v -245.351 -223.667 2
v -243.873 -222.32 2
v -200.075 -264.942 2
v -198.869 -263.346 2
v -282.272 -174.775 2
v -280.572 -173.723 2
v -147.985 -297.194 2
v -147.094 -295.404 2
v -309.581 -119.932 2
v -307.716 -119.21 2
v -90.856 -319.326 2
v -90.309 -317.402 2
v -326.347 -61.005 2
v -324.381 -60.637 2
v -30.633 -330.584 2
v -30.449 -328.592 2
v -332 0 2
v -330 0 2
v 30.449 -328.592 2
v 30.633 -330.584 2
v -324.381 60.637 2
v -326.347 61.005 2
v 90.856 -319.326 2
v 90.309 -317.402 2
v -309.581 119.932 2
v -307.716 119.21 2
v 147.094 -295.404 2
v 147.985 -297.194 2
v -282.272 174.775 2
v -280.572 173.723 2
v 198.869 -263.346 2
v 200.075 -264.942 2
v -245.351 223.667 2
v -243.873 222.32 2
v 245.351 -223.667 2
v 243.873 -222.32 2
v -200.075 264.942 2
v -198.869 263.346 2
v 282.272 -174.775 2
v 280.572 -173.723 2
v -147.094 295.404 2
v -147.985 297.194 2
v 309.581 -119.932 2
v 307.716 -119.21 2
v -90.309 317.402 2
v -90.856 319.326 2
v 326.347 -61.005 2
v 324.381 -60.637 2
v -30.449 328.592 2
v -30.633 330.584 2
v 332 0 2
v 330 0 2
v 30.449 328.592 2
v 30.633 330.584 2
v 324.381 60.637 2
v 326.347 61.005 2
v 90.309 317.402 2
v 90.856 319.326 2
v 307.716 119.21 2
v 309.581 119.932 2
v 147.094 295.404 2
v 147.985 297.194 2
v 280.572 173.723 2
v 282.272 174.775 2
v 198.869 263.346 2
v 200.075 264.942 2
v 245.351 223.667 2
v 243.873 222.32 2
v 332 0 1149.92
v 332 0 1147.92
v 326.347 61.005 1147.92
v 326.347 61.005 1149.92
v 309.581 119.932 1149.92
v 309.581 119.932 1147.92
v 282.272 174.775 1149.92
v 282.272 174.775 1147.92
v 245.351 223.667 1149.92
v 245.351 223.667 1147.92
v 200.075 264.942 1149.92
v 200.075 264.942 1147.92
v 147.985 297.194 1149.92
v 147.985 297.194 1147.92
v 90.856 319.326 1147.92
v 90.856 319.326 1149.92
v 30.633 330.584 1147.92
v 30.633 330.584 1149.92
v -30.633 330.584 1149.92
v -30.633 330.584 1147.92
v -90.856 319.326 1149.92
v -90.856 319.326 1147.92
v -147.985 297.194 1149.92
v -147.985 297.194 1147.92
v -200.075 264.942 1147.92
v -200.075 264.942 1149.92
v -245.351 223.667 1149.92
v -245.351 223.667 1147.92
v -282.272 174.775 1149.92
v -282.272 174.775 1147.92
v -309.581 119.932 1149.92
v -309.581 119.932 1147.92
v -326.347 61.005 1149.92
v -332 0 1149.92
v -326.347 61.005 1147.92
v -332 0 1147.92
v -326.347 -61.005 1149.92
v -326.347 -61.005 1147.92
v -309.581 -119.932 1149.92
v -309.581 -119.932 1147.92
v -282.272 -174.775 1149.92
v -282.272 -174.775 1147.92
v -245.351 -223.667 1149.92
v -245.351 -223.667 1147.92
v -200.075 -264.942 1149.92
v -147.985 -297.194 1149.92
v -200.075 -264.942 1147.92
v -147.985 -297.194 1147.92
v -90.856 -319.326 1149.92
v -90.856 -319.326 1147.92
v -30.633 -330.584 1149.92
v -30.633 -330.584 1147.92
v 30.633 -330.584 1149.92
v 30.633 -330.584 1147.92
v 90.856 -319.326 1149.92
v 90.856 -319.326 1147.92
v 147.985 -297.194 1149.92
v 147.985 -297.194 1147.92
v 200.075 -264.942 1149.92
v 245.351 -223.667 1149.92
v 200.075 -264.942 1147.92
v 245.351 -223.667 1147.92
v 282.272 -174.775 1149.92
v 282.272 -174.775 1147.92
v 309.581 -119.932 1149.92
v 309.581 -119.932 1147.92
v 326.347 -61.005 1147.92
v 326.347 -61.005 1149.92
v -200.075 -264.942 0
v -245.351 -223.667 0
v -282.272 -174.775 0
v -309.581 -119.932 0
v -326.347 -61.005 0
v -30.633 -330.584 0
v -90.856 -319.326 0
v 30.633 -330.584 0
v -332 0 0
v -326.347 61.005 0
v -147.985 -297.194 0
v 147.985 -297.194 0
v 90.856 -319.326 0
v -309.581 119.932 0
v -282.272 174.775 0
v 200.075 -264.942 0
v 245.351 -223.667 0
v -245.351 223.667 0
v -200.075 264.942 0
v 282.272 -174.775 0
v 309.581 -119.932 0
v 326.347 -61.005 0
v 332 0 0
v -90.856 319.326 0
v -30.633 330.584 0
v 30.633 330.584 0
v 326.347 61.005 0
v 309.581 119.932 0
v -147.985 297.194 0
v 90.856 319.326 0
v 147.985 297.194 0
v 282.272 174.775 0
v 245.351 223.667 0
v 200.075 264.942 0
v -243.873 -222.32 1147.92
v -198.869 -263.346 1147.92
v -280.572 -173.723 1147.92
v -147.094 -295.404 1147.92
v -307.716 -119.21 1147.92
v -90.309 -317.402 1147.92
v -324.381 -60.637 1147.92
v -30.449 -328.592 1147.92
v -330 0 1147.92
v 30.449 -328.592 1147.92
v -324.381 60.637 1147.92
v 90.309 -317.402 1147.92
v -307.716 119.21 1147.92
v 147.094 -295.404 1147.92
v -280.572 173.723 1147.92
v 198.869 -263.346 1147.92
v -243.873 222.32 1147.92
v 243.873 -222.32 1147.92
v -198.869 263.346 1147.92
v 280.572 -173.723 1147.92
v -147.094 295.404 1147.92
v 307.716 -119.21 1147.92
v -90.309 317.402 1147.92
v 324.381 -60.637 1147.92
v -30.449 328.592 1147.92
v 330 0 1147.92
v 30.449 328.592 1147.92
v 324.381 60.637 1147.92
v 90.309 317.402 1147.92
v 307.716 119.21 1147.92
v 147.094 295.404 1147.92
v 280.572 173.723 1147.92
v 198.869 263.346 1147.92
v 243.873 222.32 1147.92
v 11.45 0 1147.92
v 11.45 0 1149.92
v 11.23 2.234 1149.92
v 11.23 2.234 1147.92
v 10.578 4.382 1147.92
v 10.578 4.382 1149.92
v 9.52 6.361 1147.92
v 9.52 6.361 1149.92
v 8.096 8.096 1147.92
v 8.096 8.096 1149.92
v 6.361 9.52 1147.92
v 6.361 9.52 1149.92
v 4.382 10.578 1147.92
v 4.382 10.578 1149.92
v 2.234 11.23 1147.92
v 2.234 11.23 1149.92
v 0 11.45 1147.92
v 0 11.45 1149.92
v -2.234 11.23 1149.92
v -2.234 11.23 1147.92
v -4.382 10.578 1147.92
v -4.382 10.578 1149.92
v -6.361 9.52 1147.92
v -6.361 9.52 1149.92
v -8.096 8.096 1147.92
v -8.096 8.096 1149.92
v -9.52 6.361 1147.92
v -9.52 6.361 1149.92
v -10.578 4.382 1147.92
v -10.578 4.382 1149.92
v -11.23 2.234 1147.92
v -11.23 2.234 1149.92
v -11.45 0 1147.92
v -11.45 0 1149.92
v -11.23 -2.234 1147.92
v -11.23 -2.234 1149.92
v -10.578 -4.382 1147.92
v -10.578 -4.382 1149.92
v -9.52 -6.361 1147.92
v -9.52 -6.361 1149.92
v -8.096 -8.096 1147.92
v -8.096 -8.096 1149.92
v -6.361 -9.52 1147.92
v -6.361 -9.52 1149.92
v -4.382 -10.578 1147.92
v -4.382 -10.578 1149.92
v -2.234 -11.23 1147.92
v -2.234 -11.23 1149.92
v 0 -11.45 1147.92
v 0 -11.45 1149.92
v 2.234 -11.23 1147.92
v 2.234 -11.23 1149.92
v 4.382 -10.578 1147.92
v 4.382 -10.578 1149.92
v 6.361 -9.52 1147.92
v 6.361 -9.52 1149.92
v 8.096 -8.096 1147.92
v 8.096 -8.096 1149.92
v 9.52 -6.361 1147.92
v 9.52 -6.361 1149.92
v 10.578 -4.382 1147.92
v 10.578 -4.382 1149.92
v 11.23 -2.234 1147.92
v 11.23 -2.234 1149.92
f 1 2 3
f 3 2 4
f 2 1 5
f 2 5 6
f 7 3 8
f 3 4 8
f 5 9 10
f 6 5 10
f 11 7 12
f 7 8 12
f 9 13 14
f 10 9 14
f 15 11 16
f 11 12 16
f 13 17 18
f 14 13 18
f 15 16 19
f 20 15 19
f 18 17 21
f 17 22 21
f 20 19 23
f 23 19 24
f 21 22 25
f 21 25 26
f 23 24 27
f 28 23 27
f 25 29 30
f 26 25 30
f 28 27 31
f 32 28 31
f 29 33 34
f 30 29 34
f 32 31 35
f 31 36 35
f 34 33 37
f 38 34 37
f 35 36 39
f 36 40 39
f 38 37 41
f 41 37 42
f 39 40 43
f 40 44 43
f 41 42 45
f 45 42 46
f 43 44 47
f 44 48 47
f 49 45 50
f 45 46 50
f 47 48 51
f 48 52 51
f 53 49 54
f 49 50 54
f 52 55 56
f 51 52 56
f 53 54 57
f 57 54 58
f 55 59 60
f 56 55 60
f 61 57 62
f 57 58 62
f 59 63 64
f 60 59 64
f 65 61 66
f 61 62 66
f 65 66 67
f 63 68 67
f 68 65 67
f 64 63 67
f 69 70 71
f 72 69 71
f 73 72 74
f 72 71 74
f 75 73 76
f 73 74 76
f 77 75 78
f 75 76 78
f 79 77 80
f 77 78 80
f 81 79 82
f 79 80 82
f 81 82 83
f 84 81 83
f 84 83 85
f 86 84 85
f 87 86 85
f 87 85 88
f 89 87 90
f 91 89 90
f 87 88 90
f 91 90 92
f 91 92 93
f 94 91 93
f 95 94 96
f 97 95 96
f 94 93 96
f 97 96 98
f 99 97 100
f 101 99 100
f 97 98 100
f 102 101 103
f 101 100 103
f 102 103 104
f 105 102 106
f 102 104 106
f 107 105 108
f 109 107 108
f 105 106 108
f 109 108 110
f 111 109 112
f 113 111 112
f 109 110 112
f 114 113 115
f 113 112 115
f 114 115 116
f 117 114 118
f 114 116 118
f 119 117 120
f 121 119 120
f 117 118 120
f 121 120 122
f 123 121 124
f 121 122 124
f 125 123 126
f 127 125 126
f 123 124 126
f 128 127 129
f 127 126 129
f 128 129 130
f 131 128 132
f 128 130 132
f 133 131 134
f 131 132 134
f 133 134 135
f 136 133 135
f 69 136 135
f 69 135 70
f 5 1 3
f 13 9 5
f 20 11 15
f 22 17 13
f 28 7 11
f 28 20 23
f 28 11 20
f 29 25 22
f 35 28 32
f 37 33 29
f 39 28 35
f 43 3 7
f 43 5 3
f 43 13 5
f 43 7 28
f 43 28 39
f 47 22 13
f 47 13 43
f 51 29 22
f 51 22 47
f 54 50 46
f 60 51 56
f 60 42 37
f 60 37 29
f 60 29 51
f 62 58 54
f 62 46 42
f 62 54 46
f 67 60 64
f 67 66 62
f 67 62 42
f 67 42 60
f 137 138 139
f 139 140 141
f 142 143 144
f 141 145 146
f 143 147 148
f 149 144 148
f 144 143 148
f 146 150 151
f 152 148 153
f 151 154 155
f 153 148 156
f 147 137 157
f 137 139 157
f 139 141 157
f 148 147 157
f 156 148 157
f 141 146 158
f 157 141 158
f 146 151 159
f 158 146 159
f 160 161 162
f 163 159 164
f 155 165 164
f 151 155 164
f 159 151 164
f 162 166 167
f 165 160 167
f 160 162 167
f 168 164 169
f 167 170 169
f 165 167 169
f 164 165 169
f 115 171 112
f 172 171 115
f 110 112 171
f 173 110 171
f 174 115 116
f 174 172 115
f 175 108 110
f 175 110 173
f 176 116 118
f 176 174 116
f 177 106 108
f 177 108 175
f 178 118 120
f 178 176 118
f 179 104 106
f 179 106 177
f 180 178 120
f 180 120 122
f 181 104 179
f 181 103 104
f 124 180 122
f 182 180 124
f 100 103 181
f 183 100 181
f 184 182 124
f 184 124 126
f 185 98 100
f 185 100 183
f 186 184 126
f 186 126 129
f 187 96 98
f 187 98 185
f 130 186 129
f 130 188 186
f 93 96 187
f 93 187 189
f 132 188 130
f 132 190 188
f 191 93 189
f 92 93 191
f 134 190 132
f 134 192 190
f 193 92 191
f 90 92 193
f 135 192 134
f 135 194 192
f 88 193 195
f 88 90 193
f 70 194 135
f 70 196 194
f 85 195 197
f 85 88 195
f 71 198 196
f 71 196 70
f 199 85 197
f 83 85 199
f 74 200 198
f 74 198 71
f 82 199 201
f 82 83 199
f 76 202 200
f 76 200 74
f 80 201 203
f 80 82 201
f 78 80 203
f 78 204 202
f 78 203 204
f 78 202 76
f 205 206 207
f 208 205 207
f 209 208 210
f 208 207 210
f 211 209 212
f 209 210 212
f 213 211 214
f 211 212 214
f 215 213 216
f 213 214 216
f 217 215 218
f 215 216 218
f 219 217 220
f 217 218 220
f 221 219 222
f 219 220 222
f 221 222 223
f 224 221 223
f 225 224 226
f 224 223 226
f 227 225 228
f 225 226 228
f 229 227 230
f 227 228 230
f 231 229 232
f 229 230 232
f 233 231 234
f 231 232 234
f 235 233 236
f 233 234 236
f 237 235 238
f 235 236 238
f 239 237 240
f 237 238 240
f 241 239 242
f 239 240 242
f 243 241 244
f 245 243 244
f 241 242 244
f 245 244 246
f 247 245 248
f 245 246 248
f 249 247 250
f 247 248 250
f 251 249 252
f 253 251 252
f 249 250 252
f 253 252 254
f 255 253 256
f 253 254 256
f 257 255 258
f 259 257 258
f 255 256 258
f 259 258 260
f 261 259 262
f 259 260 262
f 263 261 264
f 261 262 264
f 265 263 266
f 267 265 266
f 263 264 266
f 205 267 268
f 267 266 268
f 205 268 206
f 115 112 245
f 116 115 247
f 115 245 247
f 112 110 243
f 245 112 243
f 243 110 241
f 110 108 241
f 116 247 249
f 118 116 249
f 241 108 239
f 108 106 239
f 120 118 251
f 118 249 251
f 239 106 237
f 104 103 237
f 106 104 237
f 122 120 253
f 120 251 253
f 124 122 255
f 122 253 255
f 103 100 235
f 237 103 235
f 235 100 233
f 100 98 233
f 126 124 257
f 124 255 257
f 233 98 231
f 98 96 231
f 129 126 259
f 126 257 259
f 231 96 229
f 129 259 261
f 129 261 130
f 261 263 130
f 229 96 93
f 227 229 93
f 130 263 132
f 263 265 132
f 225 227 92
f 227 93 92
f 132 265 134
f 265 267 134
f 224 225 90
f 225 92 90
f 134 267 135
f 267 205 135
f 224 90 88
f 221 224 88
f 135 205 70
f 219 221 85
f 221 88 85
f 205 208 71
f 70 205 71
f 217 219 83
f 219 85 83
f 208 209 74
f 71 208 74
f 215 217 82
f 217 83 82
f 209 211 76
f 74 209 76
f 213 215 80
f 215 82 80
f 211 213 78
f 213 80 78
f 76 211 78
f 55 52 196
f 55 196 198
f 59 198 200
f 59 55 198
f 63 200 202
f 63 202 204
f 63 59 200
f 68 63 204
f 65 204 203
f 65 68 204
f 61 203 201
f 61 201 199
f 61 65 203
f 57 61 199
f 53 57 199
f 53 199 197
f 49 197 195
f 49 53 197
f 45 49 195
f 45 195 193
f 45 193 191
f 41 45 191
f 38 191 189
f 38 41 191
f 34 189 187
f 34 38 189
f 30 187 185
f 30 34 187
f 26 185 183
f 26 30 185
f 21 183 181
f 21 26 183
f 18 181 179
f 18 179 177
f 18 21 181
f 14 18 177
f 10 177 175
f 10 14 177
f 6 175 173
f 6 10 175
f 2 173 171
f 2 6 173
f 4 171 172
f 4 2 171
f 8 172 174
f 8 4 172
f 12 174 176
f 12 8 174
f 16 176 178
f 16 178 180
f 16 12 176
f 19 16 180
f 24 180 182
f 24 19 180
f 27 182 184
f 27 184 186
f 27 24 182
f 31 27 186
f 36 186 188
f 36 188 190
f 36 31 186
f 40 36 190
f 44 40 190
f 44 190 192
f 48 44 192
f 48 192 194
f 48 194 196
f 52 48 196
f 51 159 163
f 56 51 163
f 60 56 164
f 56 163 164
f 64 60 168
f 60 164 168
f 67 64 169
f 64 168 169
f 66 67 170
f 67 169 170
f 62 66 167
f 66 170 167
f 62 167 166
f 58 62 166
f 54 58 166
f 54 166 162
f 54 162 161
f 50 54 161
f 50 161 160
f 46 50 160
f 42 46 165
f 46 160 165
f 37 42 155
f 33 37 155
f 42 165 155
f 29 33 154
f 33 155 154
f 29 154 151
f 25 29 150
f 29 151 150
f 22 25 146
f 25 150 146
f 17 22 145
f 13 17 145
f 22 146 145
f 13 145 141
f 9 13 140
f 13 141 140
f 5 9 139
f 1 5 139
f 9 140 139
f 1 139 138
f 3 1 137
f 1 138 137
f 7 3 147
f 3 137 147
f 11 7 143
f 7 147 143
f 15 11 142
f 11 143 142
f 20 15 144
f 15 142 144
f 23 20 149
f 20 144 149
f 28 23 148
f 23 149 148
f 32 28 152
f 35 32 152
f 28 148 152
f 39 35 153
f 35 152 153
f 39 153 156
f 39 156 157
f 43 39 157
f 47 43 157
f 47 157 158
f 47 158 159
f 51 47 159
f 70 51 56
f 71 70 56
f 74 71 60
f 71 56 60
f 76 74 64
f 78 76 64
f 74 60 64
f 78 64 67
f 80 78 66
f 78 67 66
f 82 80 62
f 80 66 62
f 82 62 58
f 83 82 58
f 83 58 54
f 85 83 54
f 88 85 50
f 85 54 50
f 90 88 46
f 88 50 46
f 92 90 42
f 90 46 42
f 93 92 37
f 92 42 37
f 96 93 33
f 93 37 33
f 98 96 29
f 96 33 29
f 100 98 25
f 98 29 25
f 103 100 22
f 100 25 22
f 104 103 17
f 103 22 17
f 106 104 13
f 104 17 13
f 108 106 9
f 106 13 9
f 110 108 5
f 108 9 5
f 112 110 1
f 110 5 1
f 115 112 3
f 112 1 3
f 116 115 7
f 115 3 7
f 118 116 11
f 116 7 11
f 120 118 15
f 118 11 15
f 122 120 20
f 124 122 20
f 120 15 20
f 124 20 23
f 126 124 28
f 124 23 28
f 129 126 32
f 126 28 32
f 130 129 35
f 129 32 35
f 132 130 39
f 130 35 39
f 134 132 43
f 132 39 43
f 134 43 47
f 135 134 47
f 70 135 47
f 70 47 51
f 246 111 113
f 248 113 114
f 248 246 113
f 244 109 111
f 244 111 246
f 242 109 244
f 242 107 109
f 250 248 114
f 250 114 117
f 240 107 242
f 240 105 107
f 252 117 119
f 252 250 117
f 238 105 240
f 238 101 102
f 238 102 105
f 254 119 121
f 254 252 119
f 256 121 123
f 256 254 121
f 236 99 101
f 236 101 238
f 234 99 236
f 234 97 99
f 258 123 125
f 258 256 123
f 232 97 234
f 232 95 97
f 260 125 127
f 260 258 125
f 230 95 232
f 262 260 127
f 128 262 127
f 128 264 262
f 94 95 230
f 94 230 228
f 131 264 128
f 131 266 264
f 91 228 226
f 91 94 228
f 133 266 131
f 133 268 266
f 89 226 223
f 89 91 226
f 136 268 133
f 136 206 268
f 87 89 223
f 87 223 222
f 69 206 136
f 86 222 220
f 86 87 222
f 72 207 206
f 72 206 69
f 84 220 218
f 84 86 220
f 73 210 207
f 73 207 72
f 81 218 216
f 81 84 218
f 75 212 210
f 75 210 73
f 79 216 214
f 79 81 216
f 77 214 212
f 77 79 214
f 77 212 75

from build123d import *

# Parameters (mm, degrees)
SKETCH1_R           = 332
BOSS_EXTRUDE1_DEPTH = 2
SKETCH2_R           = 332
SKETCH2_R_2         = 330
BOSS_EXTRUDE2_DEPTH = 1145.92
SKETCH4_R           = 332
BOSS_EXTRUDE4_DEPTH = 2
SKETCH5_R           = 11.45
CUT_EXTRUDE1_DEPTH  = 2


with BuildPart() as part:
    # Sketch1 → Boss-Extrude1 (new body)
    with BuildSketch(Plane.XY):
        Circle(SKETCH1_R)
    extrude(amount=BOSS_EXTRUDE1_DEPTH)


with BuildPart() as body_2:
    # Sketch2 → Boss-Extrude2 (new body)
    with BuildSketch(Plane.XY.offset(2)):
        Circle(SKETCH2_R)
        Circle(SKETCH2_R_2, mode=Mode.SUBTRACT)
    extrude(amount=BOSS_EXTRUDE2_DEPTH)


with BuildPart() as body_3:
    # Sketch4 → Boss-Extrude4 (new body)
    with BuildSketch(Plane.XY.offset(1147.92)):
        Circle(SKETCH4_R)
    extrude(amount=BOSS_EXTRUDE4_DEPTH)

    # Sketch5 → Cut-Extrude1 (cut)
    with BuildSketch(Plane.XY.offset(1149.92)):
        Circle(SKETCH5_R)
    extrude(amount=-CUT_EXTRUDE1_DEPTH, mode=Mode.SUBTRACT)


solid = Compound([part.part, body_2.part, body_3.part])
